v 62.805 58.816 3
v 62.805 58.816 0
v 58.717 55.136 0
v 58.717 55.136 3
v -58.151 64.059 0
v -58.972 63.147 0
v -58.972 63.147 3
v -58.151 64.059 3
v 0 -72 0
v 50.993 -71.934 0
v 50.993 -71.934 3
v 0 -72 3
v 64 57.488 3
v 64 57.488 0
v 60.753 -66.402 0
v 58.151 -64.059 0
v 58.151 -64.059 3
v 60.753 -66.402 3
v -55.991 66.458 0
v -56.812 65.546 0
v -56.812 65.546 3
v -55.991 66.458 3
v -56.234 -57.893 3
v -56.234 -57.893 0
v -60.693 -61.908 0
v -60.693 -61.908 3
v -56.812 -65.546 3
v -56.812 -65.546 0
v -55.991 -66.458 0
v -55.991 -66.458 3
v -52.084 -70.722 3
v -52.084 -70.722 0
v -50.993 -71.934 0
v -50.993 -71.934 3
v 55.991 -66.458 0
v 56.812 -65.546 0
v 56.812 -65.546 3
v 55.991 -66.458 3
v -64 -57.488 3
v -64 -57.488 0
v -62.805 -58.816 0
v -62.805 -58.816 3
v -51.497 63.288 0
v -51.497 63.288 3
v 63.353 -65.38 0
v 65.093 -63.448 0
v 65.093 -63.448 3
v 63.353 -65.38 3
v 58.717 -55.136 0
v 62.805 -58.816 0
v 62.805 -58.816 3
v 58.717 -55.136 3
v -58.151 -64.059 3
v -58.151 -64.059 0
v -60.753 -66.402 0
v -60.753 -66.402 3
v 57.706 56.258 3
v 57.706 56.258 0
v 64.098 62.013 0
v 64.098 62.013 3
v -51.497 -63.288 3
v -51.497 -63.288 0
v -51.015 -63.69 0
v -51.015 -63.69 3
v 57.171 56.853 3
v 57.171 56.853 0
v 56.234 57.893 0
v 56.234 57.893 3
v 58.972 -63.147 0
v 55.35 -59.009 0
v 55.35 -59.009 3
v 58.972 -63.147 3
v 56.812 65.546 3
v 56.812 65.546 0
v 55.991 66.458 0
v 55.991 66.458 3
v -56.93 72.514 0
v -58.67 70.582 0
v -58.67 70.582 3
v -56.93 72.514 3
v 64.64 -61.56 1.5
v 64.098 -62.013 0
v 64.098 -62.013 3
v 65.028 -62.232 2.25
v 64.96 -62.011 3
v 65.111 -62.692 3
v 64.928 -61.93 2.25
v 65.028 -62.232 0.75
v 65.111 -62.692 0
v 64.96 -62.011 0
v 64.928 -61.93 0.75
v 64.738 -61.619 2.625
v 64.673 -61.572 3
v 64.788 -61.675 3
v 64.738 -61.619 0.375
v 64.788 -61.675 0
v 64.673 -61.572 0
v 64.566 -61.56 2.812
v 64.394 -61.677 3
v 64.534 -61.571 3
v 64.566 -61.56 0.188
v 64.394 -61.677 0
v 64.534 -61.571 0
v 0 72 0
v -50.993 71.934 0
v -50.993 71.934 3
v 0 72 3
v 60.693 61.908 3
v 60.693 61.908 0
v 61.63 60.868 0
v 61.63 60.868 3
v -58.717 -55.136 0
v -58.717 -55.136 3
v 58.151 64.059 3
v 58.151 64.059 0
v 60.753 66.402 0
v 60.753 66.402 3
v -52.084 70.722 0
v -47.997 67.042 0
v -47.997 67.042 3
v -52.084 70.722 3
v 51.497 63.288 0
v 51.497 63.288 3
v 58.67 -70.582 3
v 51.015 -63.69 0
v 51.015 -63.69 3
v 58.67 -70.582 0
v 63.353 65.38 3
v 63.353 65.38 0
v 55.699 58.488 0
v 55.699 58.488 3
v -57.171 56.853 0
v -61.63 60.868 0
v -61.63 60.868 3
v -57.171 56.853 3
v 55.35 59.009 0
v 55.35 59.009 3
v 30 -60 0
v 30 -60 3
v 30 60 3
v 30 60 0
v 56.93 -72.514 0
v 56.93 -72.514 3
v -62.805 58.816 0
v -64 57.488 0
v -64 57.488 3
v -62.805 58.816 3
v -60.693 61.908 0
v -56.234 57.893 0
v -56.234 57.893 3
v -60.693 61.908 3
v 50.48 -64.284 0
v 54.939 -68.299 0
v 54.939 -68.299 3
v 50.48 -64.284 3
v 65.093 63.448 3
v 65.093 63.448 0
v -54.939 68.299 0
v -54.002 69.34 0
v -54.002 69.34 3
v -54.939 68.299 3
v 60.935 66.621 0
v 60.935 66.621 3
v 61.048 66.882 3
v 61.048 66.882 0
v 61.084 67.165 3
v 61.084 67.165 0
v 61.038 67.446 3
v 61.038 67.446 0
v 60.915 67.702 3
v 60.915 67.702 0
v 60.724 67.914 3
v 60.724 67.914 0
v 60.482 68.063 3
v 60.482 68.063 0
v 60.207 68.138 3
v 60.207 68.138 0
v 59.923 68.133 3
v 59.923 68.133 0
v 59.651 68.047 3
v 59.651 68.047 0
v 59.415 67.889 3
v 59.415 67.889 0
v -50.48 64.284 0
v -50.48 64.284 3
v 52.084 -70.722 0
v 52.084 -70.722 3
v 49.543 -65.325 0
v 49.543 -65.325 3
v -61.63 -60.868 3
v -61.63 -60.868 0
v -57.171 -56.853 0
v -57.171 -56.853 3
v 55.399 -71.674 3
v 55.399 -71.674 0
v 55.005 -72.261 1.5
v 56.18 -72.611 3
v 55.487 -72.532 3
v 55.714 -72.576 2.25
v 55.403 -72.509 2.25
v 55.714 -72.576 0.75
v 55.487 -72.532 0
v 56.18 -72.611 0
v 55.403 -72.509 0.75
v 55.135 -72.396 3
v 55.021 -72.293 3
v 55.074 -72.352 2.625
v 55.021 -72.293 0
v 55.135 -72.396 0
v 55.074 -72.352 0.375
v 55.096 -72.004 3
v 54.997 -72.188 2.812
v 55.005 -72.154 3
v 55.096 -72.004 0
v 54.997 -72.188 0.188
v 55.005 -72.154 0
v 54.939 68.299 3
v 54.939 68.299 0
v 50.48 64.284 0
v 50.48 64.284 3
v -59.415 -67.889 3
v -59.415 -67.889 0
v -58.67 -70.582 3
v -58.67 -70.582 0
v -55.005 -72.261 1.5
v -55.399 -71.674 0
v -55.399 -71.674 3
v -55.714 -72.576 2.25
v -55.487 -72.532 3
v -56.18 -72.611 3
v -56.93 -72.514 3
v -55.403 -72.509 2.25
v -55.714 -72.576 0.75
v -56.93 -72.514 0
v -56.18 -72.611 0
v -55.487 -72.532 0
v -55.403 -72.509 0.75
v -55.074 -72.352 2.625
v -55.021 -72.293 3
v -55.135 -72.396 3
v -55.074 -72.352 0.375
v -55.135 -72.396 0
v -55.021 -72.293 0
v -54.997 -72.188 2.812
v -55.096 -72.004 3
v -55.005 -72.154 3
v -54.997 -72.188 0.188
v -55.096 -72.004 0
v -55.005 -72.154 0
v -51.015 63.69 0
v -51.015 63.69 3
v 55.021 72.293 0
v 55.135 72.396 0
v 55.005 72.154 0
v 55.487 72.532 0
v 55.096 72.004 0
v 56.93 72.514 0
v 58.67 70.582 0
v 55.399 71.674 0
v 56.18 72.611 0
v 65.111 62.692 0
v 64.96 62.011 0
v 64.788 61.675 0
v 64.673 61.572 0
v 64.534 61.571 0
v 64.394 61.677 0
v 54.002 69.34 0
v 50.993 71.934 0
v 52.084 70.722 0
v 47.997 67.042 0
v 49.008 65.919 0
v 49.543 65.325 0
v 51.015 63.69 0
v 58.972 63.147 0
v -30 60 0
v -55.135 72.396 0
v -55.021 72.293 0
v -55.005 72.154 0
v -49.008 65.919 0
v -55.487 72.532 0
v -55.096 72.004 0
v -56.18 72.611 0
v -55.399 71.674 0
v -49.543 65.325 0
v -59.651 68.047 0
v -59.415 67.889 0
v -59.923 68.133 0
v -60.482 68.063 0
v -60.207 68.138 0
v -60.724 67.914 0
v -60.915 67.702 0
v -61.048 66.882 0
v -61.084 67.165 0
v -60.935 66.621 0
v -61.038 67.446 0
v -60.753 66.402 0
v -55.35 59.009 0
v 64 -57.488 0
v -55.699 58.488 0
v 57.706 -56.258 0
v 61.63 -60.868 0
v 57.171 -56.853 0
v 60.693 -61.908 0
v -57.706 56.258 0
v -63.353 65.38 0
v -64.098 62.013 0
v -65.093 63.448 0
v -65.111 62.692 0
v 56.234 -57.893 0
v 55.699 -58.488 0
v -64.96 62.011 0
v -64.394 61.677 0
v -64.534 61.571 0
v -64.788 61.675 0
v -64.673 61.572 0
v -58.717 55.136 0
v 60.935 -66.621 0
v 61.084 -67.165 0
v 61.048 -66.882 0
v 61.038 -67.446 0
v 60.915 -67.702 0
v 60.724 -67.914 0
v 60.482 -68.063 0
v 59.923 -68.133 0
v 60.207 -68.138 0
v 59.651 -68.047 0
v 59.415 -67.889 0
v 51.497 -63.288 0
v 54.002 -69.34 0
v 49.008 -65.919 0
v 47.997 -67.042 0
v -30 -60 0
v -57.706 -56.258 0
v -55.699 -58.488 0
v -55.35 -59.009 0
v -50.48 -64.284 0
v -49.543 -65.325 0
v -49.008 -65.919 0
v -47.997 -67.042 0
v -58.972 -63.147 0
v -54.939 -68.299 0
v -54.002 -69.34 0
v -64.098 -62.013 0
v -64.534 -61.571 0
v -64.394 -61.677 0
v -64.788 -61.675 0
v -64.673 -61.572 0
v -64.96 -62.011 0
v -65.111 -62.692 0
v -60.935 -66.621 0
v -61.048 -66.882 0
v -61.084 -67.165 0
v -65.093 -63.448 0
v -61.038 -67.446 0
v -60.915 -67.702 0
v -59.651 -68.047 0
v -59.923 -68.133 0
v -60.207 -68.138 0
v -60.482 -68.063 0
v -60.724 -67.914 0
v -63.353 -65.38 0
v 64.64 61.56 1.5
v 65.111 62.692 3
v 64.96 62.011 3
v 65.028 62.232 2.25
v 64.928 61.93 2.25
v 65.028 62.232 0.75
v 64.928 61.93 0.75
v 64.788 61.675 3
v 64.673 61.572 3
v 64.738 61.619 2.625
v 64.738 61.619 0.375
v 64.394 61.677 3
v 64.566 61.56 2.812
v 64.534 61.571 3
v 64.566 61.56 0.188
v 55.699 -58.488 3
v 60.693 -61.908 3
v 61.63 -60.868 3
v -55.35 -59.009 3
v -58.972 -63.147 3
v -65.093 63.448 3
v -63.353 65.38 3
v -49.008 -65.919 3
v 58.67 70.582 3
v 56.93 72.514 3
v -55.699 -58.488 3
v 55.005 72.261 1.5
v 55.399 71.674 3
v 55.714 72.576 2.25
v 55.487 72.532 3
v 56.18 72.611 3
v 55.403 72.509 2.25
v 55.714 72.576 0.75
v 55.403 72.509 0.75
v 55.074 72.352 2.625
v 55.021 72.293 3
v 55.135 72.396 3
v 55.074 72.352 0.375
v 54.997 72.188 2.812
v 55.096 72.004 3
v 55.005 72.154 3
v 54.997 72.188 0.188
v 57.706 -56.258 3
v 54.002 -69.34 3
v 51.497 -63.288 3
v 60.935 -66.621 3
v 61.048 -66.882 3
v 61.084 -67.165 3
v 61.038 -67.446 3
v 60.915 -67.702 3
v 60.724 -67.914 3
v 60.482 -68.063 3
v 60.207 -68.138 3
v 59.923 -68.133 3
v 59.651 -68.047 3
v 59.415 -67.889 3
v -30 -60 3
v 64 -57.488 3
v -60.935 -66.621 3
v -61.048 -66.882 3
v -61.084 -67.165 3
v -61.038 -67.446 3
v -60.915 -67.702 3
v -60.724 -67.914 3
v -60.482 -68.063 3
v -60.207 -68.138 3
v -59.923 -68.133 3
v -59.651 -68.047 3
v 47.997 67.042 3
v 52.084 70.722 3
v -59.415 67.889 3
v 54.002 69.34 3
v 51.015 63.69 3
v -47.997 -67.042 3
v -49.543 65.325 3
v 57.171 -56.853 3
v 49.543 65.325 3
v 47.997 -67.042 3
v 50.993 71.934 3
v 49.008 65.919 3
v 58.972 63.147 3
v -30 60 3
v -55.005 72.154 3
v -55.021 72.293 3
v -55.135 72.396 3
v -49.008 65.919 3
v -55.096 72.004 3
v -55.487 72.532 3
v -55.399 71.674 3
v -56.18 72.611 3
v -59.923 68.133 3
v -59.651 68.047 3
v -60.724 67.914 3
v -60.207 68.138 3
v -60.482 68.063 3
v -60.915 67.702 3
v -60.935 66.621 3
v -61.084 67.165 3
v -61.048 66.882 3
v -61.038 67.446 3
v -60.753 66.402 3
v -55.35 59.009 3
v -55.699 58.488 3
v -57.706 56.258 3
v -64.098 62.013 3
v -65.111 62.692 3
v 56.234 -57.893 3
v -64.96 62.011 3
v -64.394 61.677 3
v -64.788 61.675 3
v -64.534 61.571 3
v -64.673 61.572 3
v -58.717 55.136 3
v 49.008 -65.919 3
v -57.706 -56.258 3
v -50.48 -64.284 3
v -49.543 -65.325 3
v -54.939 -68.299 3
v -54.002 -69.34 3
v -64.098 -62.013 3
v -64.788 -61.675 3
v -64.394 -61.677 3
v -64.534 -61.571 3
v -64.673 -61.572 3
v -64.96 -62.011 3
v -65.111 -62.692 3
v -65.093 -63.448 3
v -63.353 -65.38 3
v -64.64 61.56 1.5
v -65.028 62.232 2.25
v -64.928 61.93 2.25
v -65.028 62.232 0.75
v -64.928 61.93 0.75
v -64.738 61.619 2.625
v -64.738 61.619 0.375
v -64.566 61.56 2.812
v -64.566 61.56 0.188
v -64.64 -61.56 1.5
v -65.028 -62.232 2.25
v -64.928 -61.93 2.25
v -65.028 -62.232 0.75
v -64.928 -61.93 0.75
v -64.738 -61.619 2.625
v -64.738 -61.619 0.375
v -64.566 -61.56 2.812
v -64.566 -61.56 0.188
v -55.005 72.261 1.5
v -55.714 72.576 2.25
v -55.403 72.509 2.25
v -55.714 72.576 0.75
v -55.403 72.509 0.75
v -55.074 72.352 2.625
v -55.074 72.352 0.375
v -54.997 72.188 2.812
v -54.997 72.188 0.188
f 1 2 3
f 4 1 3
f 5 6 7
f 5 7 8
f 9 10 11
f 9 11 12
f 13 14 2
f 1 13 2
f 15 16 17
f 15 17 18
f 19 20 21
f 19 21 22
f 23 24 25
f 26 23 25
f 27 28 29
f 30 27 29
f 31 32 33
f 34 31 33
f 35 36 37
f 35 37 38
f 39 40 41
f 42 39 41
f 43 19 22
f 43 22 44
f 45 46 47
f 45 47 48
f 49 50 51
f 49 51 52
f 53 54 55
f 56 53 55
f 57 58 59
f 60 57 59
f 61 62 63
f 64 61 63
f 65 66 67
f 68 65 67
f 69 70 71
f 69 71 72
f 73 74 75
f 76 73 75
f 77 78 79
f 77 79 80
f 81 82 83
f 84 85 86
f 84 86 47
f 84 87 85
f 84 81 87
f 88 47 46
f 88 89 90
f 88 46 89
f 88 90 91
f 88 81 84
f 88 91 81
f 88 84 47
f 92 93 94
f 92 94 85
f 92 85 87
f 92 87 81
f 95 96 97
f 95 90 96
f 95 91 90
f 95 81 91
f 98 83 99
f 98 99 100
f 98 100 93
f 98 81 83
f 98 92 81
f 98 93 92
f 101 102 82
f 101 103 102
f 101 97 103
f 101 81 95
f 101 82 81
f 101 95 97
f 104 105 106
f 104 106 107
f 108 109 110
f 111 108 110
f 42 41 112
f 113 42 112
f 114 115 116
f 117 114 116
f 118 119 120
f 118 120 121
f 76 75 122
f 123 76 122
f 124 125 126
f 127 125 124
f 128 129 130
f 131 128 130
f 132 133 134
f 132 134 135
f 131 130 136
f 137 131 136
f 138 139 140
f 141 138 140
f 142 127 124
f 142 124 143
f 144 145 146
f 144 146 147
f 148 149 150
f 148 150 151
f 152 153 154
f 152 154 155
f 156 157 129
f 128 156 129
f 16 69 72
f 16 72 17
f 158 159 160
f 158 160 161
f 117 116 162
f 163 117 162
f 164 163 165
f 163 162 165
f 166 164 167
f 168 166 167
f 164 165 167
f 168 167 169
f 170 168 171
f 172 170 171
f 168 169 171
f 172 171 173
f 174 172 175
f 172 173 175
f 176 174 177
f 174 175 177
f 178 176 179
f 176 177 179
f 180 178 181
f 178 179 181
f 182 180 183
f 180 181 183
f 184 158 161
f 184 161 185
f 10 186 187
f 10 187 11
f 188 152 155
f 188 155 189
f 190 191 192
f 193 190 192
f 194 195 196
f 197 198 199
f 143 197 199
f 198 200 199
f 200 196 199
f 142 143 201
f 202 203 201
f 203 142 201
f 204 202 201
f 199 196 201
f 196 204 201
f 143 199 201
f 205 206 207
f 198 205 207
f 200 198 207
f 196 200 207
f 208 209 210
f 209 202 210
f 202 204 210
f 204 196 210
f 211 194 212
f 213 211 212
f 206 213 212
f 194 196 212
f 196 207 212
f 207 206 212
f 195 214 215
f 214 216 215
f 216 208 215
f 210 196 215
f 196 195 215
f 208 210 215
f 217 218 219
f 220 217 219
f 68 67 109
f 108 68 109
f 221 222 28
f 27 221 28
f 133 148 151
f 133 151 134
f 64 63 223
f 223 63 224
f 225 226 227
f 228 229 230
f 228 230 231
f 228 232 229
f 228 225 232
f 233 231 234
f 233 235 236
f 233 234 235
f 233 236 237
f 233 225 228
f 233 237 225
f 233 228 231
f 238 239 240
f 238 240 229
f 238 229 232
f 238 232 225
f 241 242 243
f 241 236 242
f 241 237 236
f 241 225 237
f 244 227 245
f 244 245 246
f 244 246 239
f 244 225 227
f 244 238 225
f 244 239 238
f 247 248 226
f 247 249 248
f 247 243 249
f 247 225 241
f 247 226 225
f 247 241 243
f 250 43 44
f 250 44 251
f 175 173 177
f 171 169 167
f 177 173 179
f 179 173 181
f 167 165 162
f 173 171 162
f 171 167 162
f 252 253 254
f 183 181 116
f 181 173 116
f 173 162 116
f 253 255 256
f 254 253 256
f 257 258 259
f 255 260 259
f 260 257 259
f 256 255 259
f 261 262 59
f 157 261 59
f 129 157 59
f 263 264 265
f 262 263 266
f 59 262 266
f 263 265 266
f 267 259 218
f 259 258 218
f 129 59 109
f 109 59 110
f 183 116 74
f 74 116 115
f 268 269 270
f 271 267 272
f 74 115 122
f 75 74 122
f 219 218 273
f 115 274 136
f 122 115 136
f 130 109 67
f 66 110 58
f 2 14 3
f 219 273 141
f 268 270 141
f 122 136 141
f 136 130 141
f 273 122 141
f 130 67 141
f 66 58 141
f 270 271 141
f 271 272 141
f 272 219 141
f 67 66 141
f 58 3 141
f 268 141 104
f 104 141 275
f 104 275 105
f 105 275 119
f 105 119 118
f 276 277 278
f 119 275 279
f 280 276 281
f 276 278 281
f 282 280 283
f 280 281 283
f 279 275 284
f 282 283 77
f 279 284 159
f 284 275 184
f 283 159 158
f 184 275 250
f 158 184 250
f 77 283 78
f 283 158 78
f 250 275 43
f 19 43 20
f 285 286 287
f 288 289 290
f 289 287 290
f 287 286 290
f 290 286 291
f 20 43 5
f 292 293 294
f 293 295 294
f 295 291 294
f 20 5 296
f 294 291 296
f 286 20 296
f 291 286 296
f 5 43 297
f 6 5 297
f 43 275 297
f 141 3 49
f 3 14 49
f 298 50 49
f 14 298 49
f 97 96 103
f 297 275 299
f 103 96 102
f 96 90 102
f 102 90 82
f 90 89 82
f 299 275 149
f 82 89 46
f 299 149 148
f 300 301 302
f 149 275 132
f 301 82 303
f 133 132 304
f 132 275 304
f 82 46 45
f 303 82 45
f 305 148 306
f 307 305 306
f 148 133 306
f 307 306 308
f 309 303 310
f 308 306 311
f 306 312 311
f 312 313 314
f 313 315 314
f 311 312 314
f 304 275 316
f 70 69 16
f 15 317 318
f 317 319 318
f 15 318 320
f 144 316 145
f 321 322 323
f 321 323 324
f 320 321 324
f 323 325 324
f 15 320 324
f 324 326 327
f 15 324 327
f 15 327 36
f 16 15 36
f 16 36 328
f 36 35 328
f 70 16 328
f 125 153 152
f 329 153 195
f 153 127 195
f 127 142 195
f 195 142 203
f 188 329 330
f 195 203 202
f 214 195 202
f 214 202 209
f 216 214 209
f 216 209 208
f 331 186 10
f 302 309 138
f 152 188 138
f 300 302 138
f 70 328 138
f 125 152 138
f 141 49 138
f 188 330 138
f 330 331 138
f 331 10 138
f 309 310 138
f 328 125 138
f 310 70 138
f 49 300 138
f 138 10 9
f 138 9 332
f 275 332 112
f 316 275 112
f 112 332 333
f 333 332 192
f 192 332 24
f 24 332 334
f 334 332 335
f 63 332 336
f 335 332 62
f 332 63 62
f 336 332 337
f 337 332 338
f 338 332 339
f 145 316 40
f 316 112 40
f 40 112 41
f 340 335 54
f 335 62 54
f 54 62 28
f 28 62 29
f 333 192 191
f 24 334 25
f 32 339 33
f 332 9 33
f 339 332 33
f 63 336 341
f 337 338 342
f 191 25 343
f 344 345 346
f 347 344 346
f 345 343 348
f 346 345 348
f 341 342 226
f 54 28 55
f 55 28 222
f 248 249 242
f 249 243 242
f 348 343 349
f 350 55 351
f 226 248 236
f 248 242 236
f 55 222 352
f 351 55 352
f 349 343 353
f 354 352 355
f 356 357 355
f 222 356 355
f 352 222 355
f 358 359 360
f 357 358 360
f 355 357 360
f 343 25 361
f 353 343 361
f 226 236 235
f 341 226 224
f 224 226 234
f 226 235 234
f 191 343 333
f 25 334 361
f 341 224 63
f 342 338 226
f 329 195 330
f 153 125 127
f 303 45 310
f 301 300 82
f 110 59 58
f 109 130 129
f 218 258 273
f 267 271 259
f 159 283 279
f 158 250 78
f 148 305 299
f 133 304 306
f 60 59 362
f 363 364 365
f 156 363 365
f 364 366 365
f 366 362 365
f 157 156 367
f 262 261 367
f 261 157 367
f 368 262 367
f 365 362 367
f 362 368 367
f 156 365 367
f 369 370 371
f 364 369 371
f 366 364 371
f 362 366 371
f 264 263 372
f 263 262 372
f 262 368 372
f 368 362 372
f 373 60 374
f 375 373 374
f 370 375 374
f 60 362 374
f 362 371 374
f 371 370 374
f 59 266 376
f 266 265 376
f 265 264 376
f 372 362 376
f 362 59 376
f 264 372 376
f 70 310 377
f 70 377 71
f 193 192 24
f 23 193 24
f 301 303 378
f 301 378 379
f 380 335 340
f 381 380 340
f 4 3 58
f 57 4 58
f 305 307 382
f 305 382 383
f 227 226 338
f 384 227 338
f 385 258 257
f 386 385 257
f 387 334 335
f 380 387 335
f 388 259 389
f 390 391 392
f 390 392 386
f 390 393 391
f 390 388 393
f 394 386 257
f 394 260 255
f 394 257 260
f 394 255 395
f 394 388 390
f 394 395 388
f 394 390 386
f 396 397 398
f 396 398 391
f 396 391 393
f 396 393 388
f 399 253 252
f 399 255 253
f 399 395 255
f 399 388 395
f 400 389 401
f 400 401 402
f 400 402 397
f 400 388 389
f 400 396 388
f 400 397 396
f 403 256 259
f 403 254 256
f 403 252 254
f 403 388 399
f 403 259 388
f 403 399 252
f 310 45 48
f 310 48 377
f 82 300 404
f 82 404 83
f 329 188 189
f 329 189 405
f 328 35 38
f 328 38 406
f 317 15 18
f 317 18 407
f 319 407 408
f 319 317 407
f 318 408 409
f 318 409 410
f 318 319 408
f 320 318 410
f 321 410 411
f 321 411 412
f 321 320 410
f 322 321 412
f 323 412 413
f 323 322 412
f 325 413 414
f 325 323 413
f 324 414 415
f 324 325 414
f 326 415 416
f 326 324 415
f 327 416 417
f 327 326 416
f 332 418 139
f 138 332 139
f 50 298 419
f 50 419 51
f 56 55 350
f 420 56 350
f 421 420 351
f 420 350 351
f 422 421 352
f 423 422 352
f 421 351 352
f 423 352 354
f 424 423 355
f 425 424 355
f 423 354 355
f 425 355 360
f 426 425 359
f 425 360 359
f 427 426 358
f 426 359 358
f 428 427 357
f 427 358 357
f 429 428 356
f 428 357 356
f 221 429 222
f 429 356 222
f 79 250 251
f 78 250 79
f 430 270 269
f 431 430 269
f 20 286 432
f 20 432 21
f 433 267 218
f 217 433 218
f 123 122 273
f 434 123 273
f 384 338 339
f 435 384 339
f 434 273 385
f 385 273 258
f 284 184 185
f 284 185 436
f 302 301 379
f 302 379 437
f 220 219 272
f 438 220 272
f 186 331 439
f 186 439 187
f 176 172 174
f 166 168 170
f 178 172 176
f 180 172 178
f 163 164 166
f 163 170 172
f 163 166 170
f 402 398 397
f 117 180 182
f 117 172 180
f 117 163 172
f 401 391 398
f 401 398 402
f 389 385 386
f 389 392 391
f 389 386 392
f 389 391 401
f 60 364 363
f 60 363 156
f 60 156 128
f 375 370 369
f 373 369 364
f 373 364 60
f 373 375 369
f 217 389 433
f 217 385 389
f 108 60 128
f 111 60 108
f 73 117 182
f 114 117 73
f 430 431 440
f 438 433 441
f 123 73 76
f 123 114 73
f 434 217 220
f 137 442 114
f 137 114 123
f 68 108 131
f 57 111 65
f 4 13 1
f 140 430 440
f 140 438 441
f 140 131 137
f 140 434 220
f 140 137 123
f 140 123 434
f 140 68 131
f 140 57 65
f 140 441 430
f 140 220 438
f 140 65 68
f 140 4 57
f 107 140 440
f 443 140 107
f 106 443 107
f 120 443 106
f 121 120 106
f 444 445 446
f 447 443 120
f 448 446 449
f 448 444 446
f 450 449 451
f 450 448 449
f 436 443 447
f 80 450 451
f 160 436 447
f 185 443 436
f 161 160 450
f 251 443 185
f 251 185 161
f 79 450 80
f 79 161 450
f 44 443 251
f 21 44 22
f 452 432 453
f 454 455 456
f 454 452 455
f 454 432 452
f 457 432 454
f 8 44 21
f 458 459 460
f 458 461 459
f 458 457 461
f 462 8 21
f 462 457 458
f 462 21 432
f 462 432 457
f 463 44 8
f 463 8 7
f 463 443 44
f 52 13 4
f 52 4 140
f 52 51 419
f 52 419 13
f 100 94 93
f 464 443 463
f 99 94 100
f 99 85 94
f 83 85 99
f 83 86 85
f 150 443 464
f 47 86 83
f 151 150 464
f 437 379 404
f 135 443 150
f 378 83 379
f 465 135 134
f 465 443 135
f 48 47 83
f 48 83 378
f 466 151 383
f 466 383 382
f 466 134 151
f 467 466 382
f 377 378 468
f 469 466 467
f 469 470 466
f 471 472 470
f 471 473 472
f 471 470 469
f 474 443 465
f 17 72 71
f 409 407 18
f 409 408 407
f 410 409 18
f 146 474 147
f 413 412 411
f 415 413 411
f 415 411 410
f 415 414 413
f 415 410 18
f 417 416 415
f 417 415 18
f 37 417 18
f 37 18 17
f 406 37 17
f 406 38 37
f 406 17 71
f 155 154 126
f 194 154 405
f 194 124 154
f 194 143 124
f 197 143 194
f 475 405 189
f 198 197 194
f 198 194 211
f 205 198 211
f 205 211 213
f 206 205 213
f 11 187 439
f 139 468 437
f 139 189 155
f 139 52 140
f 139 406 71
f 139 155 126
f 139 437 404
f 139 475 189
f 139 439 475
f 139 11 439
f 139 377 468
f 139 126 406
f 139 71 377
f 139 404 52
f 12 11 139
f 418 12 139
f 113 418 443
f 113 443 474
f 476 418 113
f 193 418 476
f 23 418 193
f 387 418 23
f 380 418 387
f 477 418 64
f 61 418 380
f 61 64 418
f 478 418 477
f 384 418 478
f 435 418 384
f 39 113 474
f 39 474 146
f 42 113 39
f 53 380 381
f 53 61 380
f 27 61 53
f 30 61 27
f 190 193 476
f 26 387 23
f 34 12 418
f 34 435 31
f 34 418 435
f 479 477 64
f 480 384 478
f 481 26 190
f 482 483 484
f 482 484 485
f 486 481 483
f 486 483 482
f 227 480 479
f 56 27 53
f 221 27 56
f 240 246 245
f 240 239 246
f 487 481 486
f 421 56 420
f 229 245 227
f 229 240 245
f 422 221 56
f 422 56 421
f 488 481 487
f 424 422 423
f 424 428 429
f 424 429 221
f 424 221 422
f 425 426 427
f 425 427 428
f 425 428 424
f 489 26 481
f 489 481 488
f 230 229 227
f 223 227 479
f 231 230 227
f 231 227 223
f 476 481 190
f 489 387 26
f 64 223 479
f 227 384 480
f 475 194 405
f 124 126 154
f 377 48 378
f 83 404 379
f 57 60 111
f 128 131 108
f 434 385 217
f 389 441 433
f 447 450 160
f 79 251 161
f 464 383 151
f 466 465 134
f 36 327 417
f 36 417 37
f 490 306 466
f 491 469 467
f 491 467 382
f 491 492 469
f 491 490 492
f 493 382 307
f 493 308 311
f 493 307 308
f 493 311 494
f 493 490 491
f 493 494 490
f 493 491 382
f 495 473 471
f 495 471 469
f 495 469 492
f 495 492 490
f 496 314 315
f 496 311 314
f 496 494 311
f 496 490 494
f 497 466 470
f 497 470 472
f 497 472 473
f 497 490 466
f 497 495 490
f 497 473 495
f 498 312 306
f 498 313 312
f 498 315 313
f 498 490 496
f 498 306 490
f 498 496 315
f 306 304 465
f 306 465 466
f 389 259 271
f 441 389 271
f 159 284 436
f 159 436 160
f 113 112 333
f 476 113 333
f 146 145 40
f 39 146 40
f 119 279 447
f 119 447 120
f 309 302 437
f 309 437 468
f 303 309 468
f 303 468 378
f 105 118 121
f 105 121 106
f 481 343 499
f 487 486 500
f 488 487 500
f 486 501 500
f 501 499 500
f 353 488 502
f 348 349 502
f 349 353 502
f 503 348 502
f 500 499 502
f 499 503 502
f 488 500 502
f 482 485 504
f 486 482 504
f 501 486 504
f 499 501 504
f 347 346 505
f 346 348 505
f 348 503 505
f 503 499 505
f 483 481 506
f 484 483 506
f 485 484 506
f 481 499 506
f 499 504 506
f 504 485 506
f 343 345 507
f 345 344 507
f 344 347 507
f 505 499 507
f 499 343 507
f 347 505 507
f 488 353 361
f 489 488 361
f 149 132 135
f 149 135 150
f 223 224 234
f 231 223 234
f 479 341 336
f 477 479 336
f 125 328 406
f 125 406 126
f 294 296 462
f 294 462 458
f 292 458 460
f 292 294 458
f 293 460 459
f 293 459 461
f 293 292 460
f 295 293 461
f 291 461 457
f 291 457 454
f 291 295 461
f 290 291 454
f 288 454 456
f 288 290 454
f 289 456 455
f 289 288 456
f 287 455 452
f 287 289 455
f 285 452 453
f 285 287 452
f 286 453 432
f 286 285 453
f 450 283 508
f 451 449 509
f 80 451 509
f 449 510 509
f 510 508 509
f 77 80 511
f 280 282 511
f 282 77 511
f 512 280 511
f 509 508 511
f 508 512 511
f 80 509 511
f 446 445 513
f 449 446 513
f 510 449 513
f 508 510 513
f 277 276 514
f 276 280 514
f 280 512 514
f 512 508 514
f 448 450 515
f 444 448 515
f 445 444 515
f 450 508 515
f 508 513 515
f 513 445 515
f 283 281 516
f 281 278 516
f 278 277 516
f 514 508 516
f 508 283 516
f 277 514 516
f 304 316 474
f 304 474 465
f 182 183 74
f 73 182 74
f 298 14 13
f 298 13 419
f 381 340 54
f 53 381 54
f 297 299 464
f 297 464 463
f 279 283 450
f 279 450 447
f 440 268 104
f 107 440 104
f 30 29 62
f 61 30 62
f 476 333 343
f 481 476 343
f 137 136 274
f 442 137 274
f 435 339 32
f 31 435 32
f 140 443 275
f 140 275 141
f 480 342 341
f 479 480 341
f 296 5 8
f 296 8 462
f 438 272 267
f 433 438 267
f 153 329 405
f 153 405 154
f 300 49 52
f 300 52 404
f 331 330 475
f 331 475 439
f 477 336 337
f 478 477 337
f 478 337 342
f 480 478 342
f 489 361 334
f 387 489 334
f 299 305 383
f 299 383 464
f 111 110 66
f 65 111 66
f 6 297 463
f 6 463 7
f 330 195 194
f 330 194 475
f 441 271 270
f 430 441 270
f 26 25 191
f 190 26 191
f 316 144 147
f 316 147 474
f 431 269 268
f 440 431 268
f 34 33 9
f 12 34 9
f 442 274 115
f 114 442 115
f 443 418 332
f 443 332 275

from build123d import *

# Parameters (mm, degrees)
F1_DEPTH = 3
F4_W     = 60
F4_H     = 120
F5_DEPTH = 3


with BuildPart() as f1:
    # F0 (on Top) → F1 (new body)
    with BuildSketch(Plane.XY):
        with BuildLine():
            Line((64, 0), (64, 57.4883735822))
            Line((64, 57.4883735822), (62.8046343071, 58.8159616805))
            Line((62.8046343071, 58.8159616805), (58.717337767, 55.1357433455))
            Line((58.717337767, 55.1357433455), (57.7064563618, 56.2584408851))
            Line((57.7064563618, 56.2584408851), (64.0975018609, 62.0129640998))
            add(Edge.make_bspline(
                [(64.0975018609, 62.0129640998), (64.2947499686, 61.8134944285), (64.7475356166, 61.0205339905), (65.2331012875, 62.6495131608), (65.0931958217, 63.4477440608)],
                knots=[0, 0, 0, 0, 0.3763533344, 1, 1, 1, 1], degree=3))
            Line((65.0931958217, 63.4477440608), (63.3534562452, 65.379920607))
            Line((63.3534562452, 65.379920607), (55.6990645427, 58.4878753615))
            Line((55.6990645427, 58.4878753615), (55.3495648702, 59.0087018934))
            Line((55.3495648702, 59.0087018934), (58.971833562, 63.1474419824))
            Line((58.971833562, 63.1474419824), (58.1506918082, 64.0594122905))
            Line((58.1506918082, 64.0594122905), (60.7529463893, 66.4024928396))
            ThreePointArc((60.7529463893, 66.4024928396), (60.8269606084, 67.8147682715), (59.4146851766, 67.8887824906))
            Line((59.4146851766, 67.8887824906), (56.8124305955, 65.5457019415))
            Line((56.8124305955, 65.5457019415), (55.9912888418, 66.4576722496))
            Line((55.9912888418, 66.4576722496), (51.4965910242, 63.2878628661))
            Line((51.4965910242, 63.2878628661), (51.0151502982, 63.6898891399))
            Line((51.0151502982, 63.6898891399), (58.6695420007, 70.5819343854))
            Line((58.6695420007, 70.5819343854), (56.9298024241, 72.5141109316))
            add(Edge.make_bspline(
                [(55.3988039783, 71.673846831), (55.2210450643, 71.8908646511), (54.4797575345, 72.424056828), (56.1505684198, 72.7366878299), (56.9298024241, 72.5141109316)],
                knots=[0, 0, 0, 0, 0.3763533344, 1, 1, 1, 1], degree=3))
            Line((55.3988039783, 71.673846831), (49.0077584792, 65.9193236163))
            Line((49.0077584792, 65.9193236163), (47.996877074, 67.0420211559))
            Line((47.996877074, 67.0420211559), (52.0841736141, 70.7222394909))
            Line((52.0841736141, 70.7222394909), (50.9930178895, 71.9340906943))
            Line((50.9930178895, 71.9340906943), (0, 72))
            Line((0, 72), (0, 0))
            Line((0, 0), (64, 0))
        make_face()
        Polygon((61.6300208296, 60.8677403836), (57.1711518767, 56.8529567455), (56.2343690278, 57.8933595012), (60.6932379807, 61.9081431393), align=None, mode=Mode.SUBTRACT)
        Polygon((50.4798458131, 64.2844050003), (49.5430629642, 65.3248077559), (54.0019319171, 69.3395913941), (54.938714766, 68.2991886384), align=None, mode=Mode.SUBTRACT)
    extrude(amount=F1_DEPTH)

    # F2: F1 across face


with BuildPart() as f1_1:
    add(f1.part)
    add(f1.part.mirror(Plane(origin=(0, 36, 1.5), x_dir=(0, -1, 0), z_dir=(-1, 0, 0))))

    # F3: F1 across face


with BuildPart() as f1_2:
    add(f1_1.part)
    add(f1_1.part.mirror(Plane(origin=(0, 0, 1.5), x_dir=(1, 0, 0), z_dir=(0, -1, 0))))

    # F4 (on face) → F5 (cut)
    with BuildSketch(Plane.XY.offset(3)):
        Rectangle(F4_W, F4_H)
    extrude(amount=-F5_DEPTH, mode=Mode.SUBTRACT)


solid = f1_2.part
